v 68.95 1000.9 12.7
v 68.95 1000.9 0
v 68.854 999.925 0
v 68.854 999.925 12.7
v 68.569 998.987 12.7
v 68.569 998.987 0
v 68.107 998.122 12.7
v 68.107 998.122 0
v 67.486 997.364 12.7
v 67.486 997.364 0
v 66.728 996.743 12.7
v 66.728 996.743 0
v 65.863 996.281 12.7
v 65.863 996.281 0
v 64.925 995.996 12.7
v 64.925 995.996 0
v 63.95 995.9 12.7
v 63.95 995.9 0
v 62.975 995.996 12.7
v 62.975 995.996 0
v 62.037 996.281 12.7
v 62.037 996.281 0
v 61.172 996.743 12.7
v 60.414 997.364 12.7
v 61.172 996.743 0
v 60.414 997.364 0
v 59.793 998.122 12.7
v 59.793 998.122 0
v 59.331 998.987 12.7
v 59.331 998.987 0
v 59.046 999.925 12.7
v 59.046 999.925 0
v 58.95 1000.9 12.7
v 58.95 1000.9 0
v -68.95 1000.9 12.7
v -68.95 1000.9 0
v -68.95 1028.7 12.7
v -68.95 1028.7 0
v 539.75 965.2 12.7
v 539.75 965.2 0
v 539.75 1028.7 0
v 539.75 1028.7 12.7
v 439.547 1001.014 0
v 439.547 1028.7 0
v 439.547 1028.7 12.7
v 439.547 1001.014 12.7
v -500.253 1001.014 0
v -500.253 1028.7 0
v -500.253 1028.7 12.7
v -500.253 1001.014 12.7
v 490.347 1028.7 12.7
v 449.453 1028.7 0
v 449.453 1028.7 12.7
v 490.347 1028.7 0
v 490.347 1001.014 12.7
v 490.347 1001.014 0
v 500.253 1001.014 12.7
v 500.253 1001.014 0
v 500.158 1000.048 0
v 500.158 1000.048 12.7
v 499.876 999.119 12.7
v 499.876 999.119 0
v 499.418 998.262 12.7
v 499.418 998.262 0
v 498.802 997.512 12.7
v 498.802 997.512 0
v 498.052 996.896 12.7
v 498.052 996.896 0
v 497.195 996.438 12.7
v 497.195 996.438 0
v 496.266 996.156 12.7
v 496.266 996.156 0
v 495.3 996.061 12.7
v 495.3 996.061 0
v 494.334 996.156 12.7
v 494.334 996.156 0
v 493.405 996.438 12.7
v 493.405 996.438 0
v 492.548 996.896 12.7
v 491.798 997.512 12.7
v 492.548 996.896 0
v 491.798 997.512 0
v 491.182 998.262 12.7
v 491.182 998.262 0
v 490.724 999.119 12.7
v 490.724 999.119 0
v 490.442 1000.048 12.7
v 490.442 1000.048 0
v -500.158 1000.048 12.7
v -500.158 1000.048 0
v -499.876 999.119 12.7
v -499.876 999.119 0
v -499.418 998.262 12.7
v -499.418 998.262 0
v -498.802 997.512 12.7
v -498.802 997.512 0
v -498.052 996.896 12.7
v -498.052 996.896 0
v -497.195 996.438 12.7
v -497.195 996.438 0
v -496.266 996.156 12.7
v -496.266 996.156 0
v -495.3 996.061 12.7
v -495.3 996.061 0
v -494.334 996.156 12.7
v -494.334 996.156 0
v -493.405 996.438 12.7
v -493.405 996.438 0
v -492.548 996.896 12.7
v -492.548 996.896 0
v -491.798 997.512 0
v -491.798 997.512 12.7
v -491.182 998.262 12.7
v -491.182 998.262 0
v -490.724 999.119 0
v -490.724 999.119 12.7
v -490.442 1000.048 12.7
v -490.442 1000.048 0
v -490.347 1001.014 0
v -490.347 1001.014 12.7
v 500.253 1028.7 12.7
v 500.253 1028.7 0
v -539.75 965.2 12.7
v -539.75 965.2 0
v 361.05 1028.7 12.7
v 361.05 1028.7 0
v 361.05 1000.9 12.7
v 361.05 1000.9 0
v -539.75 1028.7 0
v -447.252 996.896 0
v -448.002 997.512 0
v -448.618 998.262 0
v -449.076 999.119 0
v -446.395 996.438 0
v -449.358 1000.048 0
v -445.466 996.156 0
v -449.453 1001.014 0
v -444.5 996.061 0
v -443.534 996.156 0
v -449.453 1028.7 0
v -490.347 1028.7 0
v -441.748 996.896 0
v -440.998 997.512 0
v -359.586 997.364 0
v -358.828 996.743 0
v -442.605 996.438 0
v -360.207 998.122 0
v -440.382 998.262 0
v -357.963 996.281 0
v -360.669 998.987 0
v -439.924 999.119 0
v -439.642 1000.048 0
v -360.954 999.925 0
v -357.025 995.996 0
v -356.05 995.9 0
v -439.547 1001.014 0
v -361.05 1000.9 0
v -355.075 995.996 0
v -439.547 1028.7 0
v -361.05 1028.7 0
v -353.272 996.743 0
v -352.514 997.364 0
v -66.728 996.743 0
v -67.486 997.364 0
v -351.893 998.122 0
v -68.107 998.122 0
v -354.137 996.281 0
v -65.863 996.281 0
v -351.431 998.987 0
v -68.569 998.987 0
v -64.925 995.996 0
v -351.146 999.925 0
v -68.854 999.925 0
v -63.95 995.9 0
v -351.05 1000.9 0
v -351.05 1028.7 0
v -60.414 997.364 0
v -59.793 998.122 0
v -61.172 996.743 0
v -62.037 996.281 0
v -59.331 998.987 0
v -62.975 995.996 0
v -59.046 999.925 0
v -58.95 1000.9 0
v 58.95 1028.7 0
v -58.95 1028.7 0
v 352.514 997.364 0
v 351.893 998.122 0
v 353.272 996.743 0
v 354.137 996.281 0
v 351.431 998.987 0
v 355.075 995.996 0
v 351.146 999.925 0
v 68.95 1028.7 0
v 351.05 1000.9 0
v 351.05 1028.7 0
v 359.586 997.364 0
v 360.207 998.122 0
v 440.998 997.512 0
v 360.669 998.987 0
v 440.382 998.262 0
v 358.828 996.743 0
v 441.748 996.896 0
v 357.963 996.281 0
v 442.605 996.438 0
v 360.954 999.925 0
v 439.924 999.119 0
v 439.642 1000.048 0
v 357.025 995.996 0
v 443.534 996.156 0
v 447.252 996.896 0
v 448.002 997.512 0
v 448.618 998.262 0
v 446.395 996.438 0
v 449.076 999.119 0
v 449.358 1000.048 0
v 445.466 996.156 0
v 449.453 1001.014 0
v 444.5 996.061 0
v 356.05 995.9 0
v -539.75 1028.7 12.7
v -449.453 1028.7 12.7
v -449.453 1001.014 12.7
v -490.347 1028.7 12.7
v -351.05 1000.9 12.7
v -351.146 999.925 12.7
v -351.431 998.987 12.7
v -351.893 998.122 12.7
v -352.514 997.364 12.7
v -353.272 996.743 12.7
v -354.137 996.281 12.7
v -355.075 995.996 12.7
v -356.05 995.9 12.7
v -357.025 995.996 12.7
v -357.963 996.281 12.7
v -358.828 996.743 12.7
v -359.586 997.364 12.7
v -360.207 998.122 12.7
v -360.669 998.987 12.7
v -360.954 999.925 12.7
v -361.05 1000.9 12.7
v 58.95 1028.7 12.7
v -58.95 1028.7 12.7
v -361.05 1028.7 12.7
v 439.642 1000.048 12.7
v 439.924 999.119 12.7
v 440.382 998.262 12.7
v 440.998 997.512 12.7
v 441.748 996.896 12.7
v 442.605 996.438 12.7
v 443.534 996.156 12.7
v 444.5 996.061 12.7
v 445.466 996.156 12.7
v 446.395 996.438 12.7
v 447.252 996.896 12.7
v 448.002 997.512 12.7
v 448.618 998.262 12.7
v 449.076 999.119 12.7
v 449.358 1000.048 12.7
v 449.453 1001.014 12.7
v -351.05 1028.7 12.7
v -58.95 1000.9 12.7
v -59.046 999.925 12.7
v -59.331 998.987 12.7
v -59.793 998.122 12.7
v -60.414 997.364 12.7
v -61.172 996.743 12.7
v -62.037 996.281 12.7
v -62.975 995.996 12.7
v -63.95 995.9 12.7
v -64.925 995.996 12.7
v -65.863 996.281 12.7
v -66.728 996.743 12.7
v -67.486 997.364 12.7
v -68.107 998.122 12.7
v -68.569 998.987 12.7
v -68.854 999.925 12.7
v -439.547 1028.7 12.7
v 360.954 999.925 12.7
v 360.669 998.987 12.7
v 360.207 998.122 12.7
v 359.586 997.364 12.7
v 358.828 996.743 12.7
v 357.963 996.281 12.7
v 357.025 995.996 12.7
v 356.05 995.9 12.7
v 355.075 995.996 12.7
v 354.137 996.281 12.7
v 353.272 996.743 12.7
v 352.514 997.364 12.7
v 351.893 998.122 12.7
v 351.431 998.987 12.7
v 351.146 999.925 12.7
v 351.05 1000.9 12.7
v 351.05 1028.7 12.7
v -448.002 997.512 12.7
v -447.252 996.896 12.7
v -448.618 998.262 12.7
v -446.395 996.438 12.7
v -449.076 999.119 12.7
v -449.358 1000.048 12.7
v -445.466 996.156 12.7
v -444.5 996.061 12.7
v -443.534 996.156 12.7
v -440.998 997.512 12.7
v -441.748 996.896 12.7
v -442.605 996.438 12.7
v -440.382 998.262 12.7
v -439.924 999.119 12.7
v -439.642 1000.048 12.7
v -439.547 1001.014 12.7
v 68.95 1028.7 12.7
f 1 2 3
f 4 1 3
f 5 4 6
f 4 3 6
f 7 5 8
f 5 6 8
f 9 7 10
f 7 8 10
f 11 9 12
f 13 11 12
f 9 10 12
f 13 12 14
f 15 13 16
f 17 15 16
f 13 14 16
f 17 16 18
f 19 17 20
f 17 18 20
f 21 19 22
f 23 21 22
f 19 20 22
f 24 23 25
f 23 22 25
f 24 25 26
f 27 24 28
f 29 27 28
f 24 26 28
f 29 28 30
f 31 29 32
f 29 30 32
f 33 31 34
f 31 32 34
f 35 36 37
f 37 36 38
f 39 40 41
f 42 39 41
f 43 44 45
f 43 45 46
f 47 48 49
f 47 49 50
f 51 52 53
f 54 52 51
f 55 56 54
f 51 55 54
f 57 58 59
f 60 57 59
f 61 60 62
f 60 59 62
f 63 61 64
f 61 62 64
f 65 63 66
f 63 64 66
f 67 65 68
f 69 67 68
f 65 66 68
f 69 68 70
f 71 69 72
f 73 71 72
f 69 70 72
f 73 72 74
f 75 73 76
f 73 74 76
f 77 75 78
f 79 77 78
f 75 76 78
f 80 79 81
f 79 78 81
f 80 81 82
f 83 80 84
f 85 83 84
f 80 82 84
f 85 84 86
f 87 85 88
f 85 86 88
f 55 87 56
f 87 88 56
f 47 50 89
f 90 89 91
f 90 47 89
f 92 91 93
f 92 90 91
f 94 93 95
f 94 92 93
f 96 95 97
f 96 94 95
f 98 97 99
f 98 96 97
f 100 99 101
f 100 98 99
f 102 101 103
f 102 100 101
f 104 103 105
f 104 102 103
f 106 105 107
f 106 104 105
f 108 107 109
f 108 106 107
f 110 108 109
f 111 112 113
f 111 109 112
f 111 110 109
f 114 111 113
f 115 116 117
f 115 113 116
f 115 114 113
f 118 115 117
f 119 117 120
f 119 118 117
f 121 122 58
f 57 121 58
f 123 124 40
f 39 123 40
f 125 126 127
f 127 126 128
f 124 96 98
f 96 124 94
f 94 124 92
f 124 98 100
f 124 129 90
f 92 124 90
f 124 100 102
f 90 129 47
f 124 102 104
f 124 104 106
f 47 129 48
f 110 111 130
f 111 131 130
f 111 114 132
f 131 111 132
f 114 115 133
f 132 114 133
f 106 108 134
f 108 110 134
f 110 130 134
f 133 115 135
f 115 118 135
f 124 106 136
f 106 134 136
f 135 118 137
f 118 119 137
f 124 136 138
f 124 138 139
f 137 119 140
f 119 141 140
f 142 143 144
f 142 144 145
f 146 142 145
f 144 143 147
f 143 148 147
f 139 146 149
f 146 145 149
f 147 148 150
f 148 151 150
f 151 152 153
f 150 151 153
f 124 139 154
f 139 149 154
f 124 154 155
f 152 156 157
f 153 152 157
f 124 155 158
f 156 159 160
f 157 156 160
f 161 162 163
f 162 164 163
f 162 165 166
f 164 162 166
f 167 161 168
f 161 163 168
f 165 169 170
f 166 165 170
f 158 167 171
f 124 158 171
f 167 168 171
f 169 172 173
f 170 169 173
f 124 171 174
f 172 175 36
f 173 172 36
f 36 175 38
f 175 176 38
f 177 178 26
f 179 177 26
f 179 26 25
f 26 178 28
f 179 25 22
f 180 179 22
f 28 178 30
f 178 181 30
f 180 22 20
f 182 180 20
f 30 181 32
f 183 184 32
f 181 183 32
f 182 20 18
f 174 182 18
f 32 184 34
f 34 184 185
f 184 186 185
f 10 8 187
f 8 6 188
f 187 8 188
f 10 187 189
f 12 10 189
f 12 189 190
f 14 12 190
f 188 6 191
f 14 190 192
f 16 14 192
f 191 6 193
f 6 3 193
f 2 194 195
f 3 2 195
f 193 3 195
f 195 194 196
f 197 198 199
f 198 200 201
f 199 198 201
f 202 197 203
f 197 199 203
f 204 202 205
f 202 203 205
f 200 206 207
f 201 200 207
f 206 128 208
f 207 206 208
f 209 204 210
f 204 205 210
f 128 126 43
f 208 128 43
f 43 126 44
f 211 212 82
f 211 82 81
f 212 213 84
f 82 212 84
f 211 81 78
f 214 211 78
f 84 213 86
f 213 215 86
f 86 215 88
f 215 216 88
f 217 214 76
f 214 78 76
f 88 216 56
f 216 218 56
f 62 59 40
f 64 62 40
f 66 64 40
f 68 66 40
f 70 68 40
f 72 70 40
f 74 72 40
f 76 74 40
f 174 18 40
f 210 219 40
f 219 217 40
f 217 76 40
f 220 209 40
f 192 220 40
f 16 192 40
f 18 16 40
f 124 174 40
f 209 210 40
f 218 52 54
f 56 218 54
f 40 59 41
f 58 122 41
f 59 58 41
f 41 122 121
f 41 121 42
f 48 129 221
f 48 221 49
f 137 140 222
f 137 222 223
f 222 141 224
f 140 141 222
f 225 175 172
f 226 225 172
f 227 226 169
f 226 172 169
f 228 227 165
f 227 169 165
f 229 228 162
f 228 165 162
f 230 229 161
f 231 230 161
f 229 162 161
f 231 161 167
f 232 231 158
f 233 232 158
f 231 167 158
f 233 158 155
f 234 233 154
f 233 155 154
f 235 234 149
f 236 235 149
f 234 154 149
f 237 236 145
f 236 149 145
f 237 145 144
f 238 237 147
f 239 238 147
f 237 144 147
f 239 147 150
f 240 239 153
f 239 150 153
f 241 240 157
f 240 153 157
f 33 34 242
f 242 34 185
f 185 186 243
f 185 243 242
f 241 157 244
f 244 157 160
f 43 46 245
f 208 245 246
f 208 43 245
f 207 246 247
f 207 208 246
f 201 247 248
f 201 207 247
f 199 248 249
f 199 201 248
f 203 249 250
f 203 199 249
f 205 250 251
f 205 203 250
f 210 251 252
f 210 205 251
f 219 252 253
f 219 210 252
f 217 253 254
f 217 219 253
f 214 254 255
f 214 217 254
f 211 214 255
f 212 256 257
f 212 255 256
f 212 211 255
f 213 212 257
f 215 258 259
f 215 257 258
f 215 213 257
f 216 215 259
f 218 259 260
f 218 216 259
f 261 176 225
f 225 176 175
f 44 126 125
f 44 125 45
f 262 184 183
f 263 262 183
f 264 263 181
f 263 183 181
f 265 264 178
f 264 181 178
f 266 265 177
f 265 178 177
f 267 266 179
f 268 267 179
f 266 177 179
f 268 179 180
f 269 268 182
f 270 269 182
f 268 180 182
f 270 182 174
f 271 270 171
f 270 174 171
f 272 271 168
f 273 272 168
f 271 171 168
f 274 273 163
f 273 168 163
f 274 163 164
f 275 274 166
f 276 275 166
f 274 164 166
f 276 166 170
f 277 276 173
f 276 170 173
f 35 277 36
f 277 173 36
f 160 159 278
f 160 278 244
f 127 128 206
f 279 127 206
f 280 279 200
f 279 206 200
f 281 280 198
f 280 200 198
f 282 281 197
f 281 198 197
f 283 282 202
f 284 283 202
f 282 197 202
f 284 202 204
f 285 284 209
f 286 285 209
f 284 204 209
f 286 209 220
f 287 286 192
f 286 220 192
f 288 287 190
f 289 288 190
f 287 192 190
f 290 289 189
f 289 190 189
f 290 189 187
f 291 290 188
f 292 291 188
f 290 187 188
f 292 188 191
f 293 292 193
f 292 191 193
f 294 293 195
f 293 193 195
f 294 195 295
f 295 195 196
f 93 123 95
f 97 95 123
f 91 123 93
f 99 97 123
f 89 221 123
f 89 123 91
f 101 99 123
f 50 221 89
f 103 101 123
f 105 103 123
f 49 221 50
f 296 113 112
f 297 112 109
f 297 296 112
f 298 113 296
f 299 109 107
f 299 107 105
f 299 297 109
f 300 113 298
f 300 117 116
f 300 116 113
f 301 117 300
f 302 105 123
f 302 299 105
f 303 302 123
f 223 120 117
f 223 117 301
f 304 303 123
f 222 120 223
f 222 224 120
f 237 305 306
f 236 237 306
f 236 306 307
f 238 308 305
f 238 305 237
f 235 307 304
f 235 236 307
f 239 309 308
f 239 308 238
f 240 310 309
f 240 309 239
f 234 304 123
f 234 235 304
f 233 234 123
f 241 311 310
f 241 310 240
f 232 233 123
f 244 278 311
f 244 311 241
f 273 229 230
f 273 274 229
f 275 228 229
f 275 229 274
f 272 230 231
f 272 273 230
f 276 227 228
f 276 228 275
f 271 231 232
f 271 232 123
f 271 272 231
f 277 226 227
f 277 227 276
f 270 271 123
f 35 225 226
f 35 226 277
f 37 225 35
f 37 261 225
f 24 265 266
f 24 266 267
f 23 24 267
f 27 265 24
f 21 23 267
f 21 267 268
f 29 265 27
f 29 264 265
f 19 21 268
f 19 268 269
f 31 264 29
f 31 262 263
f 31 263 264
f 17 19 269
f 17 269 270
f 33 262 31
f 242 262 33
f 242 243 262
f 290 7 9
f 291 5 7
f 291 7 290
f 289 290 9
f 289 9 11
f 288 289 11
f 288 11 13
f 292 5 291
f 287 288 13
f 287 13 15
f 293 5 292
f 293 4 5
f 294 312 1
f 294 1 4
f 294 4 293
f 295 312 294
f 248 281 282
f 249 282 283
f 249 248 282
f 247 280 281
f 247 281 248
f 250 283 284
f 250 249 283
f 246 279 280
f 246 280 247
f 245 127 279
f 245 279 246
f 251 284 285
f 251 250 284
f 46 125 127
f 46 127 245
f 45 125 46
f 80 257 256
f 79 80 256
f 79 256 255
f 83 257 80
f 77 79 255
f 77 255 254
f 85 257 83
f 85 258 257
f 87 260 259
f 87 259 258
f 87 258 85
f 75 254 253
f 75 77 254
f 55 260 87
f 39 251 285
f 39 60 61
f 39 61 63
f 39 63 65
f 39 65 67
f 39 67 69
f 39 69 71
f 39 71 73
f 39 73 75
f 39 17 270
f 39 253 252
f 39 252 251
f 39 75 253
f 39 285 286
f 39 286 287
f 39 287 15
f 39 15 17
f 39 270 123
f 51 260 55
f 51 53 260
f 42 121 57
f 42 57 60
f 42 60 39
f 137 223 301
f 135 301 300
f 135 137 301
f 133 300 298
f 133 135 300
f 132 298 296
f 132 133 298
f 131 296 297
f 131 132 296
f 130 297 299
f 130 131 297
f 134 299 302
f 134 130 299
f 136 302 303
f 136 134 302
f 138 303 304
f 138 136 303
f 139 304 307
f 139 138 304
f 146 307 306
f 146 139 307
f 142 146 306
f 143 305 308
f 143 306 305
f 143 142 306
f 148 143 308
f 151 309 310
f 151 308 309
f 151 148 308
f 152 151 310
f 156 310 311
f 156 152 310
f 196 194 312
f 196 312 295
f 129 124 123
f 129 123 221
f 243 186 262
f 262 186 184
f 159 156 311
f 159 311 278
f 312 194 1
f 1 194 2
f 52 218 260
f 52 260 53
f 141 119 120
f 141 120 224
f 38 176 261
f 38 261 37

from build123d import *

# Parameters (mm, degrees)
SKETCH1_W          = 1079.5
SKETCH1_H          = 63.5
EXTRUDE1_DEPTH     = 12.7
CUT_EXTRUDE1_DEPTH = 13.7
CUT_EXTRUDE2_DEPTH = 20.32


with BuildPart() as part:
    # Sketch1 → Extrude1 (new body)
    with BuildSketch(Plane.XY):
        with Locations((0, 996.95)):
            Rectangle(SKETCH1_W, SKETCH1_H)
    extrude(amount=EXTRUDE1_DEPTH)

    # Sketch4 → Cut-Extrude1 (cut, through all)
    with BuildSketch(Plane(origin=(0, 0, 0), x_dir=(-1, 0, 0), z_dir=(0, 0, -1))):
        with BuildLine():
            Line((-68.95, 1028.7), (-68.95, 1000.9))
            ThreePointArc((-68.95, 1000.9), (-63.95, 995.9), (-58.95, 1000.9))
            Line((-58.95, 1000.9), (-58.95, 1028.7))
            Line((-58.95, 1028.7), (-68.95, 1028.7))
        make_face()
        with BuildLine():
            Line((-351.05, 1028.7), (-361.05, 1028.7))
            Line((-361.05, 1028.7), (-361.05, 1000.9))
            ThreePointArc((-361.05, 1000.9), (-356.05, 995.9), (-351.05, 1000.9))
            Line((-351.05, 1000.9), (-351.05, 1028.7))
        make_face()
        with BuildLine():
            Line((58.95, 1028.7), (58.95, 1000.9))
            ThreePointArc((58.95, 1000.9), (63.95, 995.9), (68.95, 1000.9))
            Line((68.95, 1000.9), (68.95, 1028.7))
            Line((68.95, 1028.7), (58.95, 1028.7))
        make_face()
        with BuildLine():
            Line((351.05, 1028.7), (351.05, 1000.9))
            ThreePointArc((351.05, 1000.9), (356.05, 995.9), (361.05, 1000.9))
            Line((361.05, 1000.9), (361.05, 1028.7))
            Line((361.05, 1028.7), (351.05, 1028.7))
        make_face()
    extrude(amount=-CUT_EXTRUDE1_DEPTH, mode=Mode.SUBTRACT)

    # Sketch6 → Cut-Extrude2 (cut)
    with BuildSketch(Plane(origin=(0, 0, 0), x_dir=(-1, 0, 0), z_dir=(0, 0, -1))):
        with BuildLine():
            Line((-449.453, 1028.7), (-439.547, 1028.7))
            Line((-439.547, 1028.7), (-439.547, 1001.014))
            ThreePointArc((-439.547, 1001.014), (-444.5, 996.061), (-449.453, 1001.014))
            Line((-449.453, 1001.014), (-449.453, 1028.7))
        make_face()
        with BuildLine():
            Line((439.547, 1028.7), (449.453, 1028.7))
            Line((449.453, 1028.7), (449.453, 1001.014))
            ThreePointArc((449.453, 1001.014), (444.5, 996.061), (439.547, 1001.014))
            Line((439.547, 1001.014), (439.547, 1028.7))
        make_face()
        with BuildLine():
            Line((490.347, 1001.014), (490.347, 1028.7))
            Line((490.347, 1028.7), (500.253, 1028.7))
            Line((500.253, 1028.7), (500.253, 1001.014))
            ThreePointArc((500.253, 1001.014), (495.3, 996.061), (490.347, 1001.014))
        make_face()
        with BuildLine():
            Line((-490.347, 1001.014), (-490.347, 1028.7))
            Line((-490.347, 1028.7), (-500.253, 1028.7))
            Line((-500.253, 1028.7), (-500.253, 1001.014))
            ThreePointArc((-500.253, 1001.014), (-495.3, 996.061), (-490.347, 1001.014))
        make_face()
    extrude(amount=-CUT_EXTRUDE2_DEPTH, mode=Mode.SUBTRACT)


solid = part.part
